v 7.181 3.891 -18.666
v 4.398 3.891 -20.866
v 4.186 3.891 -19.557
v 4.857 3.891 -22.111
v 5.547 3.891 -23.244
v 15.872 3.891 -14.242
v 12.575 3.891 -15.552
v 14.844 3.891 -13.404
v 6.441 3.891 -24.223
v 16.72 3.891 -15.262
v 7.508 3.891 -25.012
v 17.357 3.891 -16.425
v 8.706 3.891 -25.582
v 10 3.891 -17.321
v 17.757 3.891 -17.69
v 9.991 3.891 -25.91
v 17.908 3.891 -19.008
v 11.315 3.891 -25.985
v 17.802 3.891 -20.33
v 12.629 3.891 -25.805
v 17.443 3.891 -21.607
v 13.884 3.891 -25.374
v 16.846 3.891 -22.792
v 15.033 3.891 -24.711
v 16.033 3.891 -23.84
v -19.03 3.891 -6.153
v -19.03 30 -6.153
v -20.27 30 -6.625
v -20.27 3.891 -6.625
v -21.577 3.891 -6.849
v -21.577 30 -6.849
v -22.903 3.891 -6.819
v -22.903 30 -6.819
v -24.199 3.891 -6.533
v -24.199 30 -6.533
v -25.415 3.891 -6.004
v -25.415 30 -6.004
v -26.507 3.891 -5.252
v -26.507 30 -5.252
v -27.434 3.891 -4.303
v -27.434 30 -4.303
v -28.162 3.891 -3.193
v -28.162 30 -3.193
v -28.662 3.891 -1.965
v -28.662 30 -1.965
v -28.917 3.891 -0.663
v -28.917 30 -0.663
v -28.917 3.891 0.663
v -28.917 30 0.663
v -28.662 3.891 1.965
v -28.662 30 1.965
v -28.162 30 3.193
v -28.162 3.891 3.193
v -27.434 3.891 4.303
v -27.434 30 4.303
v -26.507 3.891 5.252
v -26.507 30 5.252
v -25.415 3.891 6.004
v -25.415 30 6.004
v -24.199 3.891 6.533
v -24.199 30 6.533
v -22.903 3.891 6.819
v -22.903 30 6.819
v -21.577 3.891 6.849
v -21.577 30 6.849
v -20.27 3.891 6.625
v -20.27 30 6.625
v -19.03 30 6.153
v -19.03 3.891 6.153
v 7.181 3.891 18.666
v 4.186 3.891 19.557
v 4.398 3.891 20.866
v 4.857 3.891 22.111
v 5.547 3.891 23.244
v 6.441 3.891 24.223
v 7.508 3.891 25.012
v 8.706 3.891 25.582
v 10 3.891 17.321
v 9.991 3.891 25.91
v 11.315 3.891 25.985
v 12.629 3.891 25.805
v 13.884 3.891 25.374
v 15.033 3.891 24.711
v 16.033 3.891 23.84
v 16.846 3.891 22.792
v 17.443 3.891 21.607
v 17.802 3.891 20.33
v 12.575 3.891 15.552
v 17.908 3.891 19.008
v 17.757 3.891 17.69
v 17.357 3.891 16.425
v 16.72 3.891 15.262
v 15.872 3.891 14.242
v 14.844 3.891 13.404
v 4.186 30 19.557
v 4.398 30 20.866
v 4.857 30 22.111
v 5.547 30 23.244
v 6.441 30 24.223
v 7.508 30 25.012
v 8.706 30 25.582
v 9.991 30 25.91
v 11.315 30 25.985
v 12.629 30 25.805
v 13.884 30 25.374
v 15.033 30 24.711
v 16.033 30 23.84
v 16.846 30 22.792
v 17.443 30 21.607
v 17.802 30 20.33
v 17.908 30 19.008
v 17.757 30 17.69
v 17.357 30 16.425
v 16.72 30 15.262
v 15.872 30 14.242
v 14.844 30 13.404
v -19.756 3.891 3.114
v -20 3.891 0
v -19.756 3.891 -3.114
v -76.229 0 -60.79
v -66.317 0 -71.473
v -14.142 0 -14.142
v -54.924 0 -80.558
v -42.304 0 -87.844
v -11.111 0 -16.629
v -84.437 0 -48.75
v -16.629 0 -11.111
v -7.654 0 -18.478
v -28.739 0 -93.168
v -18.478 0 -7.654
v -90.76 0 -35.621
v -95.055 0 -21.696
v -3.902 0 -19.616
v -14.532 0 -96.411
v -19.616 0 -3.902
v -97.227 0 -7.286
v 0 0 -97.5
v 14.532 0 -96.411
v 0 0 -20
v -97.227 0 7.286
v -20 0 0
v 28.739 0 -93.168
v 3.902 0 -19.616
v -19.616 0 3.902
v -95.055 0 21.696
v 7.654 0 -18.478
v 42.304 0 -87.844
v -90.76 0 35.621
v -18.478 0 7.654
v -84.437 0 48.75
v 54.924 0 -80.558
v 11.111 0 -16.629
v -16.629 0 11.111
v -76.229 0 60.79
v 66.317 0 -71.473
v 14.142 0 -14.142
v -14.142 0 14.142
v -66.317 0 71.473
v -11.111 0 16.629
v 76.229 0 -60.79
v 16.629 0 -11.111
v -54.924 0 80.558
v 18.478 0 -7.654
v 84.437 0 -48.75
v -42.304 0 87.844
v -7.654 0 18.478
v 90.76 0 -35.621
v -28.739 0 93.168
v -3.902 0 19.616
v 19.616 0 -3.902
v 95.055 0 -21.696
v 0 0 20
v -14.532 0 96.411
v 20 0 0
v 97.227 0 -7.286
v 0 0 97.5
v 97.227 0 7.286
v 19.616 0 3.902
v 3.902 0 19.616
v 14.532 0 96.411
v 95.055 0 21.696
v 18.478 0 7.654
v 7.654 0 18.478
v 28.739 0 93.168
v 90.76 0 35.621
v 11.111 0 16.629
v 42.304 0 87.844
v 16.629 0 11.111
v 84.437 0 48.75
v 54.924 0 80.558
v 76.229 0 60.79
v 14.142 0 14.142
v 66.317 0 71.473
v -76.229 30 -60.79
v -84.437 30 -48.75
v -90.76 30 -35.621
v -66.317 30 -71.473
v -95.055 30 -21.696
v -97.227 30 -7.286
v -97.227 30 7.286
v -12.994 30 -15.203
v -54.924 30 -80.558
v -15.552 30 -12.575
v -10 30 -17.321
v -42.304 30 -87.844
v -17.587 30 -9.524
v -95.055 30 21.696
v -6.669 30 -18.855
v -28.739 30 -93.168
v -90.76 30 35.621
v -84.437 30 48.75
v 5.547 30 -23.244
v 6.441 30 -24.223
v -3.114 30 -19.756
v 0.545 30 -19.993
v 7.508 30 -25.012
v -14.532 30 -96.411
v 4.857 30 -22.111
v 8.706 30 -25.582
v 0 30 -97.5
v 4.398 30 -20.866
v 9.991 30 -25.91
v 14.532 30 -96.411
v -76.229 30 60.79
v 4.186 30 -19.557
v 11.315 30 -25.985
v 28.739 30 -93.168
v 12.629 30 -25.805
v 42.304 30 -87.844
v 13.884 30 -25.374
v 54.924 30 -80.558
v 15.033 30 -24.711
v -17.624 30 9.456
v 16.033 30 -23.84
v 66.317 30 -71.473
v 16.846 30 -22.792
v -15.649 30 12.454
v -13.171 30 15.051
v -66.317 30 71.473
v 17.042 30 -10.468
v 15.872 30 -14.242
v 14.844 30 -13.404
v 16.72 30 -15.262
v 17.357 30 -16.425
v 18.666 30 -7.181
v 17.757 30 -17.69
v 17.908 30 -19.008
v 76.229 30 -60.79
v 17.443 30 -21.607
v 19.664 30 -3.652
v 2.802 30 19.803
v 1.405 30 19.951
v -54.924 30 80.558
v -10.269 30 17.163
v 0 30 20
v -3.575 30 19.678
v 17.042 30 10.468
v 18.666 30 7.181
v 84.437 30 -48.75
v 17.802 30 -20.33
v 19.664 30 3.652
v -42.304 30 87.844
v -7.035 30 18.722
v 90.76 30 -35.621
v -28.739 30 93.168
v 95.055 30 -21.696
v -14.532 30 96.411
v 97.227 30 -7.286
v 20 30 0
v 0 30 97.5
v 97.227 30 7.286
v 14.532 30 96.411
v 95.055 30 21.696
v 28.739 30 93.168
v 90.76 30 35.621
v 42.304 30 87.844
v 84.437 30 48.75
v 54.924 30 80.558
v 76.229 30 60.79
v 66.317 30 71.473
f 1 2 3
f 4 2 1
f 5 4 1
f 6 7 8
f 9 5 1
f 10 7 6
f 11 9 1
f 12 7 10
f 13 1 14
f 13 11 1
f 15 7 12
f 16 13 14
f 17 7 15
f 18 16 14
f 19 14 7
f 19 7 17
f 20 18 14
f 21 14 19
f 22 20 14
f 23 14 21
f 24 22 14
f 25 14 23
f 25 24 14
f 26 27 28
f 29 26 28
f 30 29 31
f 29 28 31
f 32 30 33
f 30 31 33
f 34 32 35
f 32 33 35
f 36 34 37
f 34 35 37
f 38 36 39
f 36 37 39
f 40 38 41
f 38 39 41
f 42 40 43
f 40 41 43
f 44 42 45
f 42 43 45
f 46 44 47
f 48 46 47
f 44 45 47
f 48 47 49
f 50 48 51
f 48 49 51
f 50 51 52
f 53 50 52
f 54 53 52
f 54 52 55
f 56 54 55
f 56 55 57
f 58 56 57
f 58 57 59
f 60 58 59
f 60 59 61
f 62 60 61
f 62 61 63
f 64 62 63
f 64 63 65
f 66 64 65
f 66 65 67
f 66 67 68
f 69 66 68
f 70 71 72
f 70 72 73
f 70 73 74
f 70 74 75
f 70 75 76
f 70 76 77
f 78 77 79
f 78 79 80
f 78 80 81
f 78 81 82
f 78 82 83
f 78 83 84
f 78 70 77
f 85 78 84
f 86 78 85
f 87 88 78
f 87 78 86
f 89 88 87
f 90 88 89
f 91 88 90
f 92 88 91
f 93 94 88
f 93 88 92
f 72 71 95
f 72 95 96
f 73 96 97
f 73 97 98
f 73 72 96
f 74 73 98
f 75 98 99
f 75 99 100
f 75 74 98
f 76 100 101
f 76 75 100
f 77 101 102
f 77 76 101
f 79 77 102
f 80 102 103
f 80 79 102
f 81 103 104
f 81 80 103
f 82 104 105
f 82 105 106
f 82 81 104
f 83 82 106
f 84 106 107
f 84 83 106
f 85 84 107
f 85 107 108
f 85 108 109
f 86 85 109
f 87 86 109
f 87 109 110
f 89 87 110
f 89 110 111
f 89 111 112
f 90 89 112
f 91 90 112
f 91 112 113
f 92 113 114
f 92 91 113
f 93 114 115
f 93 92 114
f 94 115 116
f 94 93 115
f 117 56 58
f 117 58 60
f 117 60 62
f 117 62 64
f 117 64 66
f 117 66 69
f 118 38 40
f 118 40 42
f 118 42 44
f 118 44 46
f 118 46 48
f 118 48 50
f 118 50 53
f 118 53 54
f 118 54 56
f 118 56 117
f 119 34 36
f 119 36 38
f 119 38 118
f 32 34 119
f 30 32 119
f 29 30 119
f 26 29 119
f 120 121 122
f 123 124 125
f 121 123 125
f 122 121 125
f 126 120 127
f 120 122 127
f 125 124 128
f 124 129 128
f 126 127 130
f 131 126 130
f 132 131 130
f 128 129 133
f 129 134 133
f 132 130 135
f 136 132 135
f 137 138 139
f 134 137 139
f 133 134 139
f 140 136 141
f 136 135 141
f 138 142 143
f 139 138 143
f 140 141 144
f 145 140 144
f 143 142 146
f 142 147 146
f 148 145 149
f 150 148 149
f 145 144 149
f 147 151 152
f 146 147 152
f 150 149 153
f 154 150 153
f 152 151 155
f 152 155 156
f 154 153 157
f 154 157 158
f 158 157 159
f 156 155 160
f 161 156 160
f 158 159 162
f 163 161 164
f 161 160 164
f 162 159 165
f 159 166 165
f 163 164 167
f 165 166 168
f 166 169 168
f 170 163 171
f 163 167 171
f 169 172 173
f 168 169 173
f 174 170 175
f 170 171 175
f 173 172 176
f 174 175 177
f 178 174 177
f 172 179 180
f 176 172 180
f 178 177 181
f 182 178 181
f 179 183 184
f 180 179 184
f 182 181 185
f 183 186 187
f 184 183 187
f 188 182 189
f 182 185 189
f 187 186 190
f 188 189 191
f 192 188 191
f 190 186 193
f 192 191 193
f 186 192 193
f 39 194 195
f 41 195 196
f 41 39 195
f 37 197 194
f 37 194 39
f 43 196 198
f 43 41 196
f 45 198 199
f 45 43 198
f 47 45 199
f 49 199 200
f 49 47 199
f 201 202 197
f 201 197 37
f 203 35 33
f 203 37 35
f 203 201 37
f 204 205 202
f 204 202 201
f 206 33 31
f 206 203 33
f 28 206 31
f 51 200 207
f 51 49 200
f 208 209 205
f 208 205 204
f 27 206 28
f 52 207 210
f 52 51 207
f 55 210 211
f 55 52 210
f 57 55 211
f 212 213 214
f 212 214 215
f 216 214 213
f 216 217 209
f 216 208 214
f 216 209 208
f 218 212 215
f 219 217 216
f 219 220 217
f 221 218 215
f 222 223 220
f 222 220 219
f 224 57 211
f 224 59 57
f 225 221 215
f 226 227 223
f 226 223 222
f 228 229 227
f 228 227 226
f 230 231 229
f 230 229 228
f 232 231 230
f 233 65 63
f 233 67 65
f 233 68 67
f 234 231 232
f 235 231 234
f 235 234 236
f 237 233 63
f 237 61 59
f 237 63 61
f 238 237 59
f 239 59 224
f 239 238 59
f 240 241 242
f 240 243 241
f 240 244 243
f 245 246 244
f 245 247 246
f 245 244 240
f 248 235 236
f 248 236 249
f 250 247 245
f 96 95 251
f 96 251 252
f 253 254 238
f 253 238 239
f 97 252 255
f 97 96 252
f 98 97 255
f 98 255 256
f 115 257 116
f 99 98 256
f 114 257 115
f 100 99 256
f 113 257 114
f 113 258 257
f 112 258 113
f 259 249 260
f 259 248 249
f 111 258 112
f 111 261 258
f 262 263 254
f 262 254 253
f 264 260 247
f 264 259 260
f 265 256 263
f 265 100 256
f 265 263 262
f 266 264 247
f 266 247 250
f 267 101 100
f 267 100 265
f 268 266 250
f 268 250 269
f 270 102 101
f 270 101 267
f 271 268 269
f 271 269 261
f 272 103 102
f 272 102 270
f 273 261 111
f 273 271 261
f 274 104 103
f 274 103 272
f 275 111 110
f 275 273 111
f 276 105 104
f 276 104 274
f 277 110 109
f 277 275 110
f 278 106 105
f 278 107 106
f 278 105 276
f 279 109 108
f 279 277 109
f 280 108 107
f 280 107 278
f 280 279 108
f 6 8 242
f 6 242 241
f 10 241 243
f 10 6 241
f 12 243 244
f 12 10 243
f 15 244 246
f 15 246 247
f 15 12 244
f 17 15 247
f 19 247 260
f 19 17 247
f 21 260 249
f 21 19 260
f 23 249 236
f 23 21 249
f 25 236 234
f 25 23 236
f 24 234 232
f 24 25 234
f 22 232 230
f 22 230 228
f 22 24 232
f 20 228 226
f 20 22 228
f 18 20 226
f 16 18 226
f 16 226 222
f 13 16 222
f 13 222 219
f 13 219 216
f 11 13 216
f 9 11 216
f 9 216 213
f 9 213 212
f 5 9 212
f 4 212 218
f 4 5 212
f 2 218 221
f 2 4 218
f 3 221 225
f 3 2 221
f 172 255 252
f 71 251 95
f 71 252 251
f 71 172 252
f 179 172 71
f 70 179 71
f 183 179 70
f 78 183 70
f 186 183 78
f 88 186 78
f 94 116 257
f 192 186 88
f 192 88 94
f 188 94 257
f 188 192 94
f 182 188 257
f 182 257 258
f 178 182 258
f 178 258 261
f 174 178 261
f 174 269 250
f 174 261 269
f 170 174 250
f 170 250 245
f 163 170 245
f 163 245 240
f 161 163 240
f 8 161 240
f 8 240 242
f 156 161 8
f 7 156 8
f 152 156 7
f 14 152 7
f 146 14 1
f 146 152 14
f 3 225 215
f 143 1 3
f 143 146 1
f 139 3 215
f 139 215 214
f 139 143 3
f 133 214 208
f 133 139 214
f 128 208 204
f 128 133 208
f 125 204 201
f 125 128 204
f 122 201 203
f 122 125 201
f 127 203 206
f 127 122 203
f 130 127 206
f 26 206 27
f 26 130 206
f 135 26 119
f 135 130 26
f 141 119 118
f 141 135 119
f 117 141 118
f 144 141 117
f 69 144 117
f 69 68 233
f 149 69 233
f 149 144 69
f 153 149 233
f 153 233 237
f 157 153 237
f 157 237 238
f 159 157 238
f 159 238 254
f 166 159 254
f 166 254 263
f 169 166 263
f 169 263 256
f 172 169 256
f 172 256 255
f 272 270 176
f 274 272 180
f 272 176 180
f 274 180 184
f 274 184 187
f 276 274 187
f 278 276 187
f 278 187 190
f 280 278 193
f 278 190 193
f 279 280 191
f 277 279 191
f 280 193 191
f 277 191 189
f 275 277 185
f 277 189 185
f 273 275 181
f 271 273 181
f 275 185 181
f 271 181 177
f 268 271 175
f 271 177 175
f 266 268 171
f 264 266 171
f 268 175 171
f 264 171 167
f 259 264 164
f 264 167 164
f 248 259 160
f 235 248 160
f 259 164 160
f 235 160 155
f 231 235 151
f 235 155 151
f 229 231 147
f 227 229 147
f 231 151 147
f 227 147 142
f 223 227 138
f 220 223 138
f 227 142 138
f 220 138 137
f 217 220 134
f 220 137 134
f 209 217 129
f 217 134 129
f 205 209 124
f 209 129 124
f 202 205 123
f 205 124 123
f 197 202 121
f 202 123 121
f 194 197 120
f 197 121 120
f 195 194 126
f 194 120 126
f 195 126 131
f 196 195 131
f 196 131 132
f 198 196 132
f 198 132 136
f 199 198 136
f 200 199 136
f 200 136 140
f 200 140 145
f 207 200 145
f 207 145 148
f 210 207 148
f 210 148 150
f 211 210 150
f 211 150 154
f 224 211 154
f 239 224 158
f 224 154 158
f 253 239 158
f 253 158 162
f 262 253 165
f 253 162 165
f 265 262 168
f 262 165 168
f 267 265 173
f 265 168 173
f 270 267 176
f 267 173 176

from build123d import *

# Parameters (mm, degrees)
SKETCH1_R           = 97.5
BOSS_EXTRUDE1_DEPTH = 30
SKETCH2_R           = 20
CUT_EXTRUDE1_DEPTH  = 142.111657917
SKETCH3_R           = 6.867943311
CUT_EXTRUDE2_DEPTH  = 26.109463305
CIRPATTERN1_COUNT   = 3


with BuildPart() as part:
    # Sketch1 → Boss-Extrude1 (new body)
    with BuildSketch(Plane(origin=(0, 0, 0), x_dir=(1, 0, 0), z_dir=(0, 1, 0))):
        Circle(SKETCH1_R)
    extrude(amount=BOSS_EXTRUDE1_DEPTH)

    # Sketch2 → Cut-Extrude1 (cut, through all)
    with BuildSketch(Plane(origin=(0, 0, 0), x_dir=(1, 0, 0), z_dir=(0, 1, 0))):
        Circle(SKETCH2_R)
    extrude(amount=CUT_EXTRUDE1_DEPTH, mode=Mode.SUBTRACT)

    # Sketch3 → Cut-Extrude2 (cut)
    with BuildSketch(Plane(origin=(0, 30, 0), x_dir=(1, 0, 0), z_dir=(0, 1, 0))):
        with Locations((-22.081174807, 0)):
            Circle(SKETCH3_R)
    cut_extrude2 = extrude(amount=-CUT_EXTRUDE2_DEPTH, mode=Mode.SUBTRACT)

    # CirPattern1: Cut-Extrude2 ×3 about axis
    cirpattern1_axis = Axis((0, 0, 0), (0, 1, 0))
    for i in range(1, CIRPATTERN1_COUNT):
        add(cut_extrude2.rotate(cirpattern1_axis, i * 360 / CIRPATTERN1_COUNT), mode=Mode.SUBTRACT)


solid = part.part
